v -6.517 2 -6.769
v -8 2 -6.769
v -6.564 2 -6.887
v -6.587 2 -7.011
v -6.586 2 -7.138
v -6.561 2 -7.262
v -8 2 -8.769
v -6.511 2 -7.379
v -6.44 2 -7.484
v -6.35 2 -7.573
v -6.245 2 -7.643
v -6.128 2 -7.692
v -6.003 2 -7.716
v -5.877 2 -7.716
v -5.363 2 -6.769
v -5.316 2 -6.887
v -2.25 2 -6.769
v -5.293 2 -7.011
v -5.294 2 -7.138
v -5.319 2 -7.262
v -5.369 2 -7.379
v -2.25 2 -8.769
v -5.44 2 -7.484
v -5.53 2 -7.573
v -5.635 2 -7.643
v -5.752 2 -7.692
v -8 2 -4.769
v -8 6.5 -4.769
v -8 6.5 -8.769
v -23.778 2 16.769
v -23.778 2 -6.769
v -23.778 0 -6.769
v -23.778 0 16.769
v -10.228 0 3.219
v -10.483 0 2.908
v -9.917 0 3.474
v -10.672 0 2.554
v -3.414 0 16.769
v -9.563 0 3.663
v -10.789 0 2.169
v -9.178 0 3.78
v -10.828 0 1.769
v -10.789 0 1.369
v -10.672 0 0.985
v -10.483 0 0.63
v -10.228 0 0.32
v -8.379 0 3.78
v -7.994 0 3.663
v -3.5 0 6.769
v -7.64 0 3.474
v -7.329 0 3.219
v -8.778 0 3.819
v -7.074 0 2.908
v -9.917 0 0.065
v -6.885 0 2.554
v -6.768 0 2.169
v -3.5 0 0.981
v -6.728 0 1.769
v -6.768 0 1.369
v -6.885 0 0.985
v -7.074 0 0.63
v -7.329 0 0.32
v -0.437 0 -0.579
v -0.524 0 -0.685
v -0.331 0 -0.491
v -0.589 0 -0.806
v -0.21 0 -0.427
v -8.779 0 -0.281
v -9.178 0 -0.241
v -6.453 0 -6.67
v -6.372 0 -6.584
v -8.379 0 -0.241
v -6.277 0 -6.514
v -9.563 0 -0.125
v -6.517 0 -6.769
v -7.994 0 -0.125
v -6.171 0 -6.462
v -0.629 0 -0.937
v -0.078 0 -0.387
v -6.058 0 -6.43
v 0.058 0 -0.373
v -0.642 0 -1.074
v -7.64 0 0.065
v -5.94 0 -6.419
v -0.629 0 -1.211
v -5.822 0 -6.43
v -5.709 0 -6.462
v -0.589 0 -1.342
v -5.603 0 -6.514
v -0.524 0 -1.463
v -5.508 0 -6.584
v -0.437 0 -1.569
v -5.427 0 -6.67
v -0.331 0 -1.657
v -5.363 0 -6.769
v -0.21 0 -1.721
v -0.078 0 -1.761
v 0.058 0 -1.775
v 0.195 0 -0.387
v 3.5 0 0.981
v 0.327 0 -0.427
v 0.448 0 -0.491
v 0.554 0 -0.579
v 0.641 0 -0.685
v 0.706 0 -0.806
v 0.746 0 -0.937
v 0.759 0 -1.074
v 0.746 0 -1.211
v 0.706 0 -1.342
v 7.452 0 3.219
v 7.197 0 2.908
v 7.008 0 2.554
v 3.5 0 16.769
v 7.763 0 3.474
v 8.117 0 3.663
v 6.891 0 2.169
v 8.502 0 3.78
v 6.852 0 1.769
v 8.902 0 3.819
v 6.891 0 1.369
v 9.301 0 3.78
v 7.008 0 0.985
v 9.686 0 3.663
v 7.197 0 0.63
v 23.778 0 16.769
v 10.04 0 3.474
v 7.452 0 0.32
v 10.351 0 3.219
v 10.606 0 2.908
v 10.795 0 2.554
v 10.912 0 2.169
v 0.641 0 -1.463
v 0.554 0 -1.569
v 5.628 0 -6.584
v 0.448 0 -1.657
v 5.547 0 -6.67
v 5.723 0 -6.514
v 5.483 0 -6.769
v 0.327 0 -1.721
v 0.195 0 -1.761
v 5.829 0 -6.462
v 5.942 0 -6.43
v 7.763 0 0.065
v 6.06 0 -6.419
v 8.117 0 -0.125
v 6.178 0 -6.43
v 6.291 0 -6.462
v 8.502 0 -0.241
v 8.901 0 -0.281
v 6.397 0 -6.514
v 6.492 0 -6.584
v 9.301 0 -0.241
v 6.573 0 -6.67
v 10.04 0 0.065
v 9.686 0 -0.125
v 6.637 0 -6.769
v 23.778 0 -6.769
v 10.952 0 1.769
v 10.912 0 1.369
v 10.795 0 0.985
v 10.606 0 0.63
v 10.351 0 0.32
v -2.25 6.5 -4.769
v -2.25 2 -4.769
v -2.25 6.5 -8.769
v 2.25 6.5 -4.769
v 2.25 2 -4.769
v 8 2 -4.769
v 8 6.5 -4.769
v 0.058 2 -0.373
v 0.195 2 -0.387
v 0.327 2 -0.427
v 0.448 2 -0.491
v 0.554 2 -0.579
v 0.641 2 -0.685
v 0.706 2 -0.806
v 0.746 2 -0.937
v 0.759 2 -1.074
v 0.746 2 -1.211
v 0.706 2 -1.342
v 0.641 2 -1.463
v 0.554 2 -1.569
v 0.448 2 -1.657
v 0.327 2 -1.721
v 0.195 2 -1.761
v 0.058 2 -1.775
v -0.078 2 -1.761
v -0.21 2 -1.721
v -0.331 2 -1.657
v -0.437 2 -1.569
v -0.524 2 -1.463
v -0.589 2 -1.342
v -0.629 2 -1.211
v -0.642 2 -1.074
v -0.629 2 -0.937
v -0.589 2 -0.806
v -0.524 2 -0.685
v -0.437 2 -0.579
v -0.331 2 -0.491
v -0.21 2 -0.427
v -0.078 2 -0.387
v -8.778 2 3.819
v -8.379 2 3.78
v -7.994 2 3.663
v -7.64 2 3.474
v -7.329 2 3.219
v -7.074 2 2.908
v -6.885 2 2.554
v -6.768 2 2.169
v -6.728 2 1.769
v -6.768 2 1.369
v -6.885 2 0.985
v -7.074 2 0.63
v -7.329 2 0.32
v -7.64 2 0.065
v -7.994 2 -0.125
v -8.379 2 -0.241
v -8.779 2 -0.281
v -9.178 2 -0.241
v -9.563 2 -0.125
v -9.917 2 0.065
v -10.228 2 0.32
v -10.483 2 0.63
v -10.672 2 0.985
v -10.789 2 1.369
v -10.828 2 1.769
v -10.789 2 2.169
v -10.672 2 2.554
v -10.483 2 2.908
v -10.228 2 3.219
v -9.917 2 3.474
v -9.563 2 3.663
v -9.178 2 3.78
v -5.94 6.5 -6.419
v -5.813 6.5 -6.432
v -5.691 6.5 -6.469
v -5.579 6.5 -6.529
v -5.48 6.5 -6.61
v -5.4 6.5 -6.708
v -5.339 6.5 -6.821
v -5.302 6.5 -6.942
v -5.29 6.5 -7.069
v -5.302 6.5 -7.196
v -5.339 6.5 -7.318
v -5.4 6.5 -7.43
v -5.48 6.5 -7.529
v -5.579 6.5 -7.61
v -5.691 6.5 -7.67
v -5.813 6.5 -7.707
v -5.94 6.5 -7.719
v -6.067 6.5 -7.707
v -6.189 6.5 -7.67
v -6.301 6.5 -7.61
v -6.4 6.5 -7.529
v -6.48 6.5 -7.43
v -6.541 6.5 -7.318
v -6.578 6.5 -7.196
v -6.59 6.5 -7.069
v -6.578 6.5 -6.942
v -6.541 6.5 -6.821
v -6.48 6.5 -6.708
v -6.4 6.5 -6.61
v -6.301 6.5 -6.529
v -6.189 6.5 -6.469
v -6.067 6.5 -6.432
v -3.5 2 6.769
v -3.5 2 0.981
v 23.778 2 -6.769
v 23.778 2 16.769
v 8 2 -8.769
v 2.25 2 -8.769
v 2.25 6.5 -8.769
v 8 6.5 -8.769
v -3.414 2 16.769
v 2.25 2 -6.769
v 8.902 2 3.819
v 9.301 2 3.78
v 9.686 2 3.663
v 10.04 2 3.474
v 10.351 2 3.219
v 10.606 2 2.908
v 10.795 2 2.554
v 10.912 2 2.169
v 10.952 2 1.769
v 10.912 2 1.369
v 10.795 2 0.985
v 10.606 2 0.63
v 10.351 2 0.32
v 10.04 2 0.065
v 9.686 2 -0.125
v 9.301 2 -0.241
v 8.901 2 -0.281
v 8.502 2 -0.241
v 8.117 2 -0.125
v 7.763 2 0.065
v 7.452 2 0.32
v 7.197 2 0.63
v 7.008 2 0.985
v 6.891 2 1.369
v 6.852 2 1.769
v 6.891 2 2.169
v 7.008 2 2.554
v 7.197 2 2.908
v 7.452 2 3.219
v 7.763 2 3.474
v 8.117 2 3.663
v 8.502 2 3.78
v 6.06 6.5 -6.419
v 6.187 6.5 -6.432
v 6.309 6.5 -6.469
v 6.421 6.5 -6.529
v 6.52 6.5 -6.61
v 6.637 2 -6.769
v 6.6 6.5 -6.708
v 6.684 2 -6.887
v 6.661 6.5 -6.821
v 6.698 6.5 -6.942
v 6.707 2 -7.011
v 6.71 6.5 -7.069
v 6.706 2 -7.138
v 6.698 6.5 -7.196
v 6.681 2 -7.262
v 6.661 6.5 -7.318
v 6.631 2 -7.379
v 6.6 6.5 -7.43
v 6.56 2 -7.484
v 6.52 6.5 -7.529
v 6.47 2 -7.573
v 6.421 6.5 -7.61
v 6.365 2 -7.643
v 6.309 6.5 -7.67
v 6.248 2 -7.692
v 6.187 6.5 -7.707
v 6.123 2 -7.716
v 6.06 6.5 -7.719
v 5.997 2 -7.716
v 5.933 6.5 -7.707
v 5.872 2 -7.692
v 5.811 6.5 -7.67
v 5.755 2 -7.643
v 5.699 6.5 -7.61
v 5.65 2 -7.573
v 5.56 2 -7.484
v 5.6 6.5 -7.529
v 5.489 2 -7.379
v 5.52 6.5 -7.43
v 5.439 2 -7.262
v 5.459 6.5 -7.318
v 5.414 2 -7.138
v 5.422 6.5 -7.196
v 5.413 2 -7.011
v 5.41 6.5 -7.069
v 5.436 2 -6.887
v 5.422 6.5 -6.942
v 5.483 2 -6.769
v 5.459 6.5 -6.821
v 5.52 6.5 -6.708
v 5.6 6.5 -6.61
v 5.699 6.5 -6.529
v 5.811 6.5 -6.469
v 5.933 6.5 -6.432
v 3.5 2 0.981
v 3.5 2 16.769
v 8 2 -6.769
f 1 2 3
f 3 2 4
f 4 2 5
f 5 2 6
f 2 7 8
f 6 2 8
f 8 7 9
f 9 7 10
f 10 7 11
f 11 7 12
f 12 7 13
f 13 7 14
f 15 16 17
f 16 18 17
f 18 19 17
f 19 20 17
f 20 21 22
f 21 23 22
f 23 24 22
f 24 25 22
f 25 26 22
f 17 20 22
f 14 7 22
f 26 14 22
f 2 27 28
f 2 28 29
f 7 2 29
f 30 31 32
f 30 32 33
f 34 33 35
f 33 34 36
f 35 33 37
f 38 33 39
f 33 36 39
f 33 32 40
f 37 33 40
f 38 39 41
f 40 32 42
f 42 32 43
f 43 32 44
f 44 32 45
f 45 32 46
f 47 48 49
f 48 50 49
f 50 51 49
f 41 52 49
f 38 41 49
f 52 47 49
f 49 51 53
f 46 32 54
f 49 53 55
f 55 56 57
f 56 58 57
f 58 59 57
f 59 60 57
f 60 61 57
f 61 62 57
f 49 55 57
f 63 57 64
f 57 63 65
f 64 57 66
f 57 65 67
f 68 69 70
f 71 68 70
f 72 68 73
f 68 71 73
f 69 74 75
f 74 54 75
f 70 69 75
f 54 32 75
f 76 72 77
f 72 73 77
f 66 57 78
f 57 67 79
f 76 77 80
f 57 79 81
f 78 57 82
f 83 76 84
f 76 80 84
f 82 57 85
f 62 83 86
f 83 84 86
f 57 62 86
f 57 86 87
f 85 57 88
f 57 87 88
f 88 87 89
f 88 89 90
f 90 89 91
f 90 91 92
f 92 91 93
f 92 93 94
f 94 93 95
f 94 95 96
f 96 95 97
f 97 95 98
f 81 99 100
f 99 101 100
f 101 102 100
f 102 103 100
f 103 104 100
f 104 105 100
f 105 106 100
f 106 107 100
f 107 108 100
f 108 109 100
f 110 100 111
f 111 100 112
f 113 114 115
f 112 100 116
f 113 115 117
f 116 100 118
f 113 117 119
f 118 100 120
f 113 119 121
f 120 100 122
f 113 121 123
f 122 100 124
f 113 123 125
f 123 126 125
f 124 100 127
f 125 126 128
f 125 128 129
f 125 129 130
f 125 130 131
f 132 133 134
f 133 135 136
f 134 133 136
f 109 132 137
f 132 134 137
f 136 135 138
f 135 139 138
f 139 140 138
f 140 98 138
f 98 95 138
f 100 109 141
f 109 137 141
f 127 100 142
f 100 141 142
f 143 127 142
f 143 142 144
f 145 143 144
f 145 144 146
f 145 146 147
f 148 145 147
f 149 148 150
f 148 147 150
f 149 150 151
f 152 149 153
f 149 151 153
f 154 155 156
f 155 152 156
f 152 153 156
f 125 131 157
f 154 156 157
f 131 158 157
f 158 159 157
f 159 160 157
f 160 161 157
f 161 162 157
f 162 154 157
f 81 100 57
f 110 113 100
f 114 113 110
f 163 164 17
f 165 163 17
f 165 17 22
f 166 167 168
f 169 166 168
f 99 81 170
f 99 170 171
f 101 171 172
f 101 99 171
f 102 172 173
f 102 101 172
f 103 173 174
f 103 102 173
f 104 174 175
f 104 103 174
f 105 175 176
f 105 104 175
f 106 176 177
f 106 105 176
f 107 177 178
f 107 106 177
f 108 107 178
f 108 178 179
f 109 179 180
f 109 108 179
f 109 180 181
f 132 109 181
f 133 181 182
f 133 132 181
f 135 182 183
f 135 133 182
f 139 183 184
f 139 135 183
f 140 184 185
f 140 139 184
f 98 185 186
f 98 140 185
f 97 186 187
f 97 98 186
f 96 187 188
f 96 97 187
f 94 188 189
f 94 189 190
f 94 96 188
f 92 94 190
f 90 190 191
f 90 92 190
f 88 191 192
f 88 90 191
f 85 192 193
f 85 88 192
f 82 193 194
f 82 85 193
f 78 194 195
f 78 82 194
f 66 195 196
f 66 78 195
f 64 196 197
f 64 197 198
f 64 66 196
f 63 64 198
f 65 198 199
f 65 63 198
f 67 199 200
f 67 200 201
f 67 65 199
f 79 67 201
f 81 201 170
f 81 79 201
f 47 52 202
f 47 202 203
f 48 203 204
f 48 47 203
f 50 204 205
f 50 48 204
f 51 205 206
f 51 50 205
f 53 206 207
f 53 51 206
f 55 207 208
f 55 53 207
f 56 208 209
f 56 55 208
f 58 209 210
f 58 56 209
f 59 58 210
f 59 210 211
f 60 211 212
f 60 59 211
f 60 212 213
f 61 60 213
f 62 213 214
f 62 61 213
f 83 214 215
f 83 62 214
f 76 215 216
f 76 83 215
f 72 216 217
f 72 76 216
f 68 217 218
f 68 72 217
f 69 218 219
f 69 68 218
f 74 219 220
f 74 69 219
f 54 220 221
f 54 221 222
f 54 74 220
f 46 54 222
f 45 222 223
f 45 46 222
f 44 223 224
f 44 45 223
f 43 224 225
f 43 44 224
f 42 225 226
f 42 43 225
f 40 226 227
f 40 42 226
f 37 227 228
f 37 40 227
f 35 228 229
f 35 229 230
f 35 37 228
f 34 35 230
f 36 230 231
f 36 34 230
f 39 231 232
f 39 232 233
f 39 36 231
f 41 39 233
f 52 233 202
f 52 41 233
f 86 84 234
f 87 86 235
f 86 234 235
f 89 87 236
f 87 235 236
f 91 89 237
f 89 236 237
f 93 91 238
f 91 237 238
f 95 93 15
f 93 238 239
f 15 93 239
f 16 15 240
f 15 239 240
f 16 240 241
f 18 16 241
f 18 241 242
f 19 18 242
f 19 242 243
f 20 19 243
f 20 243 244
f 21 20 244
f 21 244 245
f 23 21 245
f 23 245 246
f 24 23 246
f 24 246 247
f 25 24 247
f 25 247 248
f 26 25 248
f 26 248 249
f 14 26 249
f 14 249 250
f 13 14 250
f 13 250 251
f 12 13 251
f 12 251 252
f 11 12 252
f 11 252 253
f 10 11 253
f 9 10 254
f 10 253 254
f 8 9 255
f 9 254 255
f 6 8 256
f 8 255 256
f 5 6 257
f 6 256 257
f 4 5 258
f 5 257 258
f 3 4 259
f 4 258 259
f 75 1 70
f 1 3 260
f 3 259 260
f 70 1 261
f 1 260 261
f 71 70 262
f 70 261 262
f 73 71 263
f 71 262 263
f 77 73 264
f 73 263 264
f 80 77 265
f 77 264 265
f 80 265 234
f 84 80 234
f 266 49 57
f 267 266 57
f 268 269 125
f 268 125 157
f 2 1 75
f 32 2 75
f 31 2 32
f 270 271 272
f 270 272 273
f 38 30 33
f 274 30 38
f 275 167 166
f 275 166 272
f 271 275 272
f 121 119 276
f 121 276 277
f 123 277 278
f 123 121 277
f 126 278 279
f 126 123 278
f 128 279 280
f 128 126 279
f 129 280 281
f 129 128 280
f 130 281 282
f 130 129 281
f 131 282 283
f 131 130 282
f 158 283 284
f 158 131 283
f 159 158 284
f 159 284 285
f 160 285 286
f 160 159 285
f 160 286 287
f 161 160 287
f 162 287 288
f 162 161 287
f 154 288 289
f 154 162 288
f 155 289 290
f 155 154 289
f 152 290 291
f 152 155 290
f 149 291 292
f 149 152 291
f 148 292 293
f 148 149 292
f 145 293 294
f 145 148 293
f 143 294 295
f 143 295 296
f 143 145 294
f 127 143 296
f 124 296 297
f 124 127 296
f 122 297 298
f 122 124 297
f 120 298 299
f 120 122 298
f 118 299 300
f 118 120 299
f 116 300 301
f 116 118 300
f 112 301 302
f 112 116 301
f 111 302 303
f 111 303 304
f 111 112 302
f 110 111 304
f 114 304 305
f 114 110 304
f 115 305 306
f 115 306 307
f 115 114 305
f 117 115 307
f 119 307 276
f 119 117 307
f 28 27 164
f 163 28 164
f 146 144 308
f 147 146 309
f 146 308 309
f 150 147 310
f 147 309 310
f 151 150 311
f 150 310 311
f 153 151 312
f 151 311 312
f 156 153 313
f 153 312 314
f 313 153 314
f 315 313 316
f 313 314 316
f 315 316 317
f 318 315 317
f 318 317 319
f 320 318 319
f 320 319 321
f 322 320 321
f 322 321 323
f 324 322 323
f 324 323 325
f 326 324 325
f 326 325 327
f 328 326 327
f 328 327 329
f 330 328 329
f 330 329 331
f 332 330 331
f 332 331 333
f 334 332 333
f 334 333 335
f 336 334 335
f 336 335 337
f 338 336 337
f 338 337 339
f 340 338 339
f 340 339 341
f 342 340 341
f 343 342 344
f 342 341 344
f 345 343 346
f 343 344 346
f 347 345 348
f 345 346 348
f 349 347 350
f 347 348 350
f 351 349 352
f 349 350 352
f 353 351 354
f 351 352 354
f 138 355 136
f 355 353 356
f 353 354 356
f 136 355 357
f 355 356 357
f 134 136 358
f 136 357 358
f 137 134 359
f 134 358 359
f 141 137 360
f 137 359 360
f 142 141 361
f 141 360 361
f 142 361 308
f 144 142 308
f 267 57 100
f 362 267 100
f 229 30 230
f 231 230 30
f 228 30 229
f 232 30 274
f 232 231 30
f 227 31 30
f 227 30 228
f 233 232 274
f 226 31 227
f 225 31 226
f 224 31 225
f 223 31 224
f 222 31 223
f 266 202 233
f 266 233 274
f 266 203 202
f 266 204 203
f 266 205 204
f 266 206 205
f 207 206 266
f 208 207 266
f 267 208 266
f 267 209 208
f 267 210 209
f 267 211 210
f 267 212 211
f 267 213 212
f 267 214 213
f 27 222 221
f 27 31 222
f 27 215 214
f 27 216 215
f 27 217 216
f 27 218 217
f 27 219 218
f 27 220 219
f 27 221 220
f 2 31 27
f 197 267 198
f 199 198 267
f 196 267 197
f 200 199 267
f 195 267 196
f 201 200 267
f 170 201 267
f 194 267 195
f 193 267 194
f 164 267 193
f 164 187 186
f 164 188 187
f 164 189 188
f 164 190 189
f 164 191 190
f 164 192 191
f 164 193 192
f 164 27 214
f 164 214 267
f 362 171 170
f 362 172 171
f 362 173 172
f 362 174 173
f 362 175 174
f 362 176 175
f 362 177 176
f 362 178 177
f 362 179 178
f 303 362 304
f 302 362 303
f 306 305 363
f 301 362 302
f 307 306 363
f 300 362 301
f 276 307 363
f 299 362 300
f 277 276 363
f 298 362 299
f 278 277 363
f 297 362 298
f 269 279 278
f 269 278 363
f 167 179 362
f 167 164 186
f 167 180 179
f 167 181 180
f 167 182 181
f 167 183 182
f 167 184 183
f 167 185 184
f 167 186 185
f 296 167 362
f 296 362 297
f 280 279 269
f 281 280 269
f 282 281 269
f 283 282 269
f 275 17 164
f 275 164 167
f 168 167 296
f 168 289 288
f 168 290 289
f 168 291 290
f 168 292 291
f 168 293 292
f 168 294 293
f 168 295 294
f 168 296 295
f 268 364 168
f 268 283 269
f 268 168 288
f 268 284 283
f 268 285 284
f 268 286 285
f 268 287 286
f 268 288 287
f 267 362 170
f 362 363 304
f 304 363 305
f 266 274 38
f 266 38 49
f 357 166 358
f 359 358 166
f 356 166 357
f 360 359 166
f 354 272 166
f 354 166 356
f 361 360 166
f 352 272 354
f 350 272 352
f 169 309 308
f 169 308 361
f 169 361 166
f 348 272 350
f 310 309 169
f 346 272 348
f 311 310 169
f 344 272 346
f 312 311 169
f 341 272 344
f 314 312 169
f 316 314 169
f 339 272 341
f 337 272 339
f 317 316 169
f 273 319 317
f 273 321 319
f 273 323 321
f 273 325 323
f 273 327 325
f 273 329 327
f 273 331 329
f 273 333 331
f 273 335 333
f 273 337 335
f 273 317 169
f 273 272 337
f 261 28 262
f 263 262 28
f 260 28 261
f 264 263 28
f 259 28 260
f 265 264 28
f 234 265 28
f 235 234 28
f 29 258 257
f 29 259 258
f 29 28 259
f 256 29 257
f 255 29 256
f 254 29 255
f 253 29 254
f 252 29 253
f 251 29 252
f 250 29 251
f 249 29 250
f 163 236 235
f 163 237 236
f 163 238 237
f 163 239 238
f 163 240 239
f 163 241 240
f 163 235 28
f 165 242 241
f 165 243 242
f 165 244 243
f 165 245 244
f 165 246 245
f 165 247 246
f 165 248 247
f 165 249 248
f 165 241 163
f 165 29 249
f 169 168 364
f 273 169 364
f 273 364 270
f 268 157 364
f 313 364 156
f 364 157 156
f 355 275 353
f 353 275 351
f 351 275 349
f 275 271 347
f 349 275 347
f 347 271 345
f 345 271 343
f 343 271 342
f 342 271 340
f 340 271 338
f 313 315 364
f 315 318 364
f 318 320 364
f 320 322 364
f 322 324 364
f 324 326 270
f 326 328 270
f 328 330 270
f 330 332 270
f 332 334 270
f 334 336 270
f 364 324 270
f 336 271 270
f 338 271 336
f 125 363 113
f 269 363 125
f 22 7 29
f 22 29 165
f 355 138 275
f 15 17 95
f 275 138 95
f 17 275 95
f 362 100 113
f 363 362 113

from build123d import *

# Parameters (mm, degrees)
SKETCH2_R           = 2.05
SKETCH2_R_2         = 0.700643725
BOSS_EXTRUDE1_DEPTH = 2
SKETCH3_W           = 5.75
SKETCH3_H           = 4
BOSS_EXTRUDE2_DEPTH = 4.5
SKETCH4_R           = 0.65
CUT_EXTRUDE1_DEPTH  = 18.578324987
BOSS_EXTRUDE3_DEPTH = 2


with BuildPart() as part:
    # Sketch2 → Boss-Extrude1 (new body)
    with BuildSketch(Plane(origin=(0, 0, 0), x_dir=(1, 0, 0), z_dir=(0, 1, 0))):
        Polygon((-3.5, -6.76929), (-3.5, -0.98071), (3.5, -0.98071), (3.5, -6.76929), (13.7785, -6.76929), (13.7785, 6.76929), (-13.7785, 6.76929), (-13.7785, -6.76929), align=None)
        with Locations(Location((-8.7785, -1.76929, 0), (0, 0, 270))):
            Circle(SKETCH2_R, mode=Mode.SUBTRACT)
        with Locations(Location((8.9015, -1.76929, 0), (0, 0, 270))):
            Circle(SKETCH2_R, mode=Mode.SUBTRACT)
        with Locations(Location((0.0585, 1.07400228, 0), (0, 0, 270))):
            Circle(SKETCH2_R_2, mode=Mode.SUBTRACT)
    extrude(amount=BOSS_EXTRUDE1_DEPTH)

    # Sketch3 → Boss-Extrude2 (add)
    with BuildSketch(Plane(origin=(0, 2, 0), x_dir=(1, 0, 0), z_dir=(0, 1, 0))):
        with Locations((-5.125, 6.76929)):
            Rectangle(SKETCH3_W, SKETCH3_H)
        with Locations((5.125, 6.76929)):
            Rectangle(SKETCH3_W, SKETCH3_H)
    extrude(amount=BOSS_EXTRUDE2_DEPTH)

    # Sketch4 → Cut-Extrude1 (cut, through all)
    with BuildSketch(Plane(origin=(0, 6.5, 0), x_dir=(1, 0, 0), z_dir=(0, 1, 0))):
        with Locations(Location((-5.94, 7.06929, 0), (0, 0, 270))):
            Circle(SKETCH4_R)
        with Locations(Location((6.06, 7.06929, 0), (0, 0, 270))):
            Circle(SKETCH4_R)
    extrude(amount=-CUT_EXTRUDE1_DEPTH, mode=Mode.SUBTRACT)

    # Sketch5 → Boss-Extrude3 (add)
    with BuildSketch(Plane(origin=(0, 2, 0), x_dir=(1, 0, 0), z_dir=(0, 1, 0))):
        Polygon((-13.7785, 6.76929), (-23.7785, 6.76929), (-23.7785, -16.768919175), (-3.413881725, -16.768919175), (-3.5, -6.76929), (-13.7785, -6.76929), align=None)
        Polygon((3.5, -6.76929), (3.5, -16.768919175), (23.7785, -16.768919175), (23.7785, 6.76929), (13.7785, 6.76929), (13.7785, -6.76929), align=None)
    extrude(amount=-BOSS_EXTRUDE3_DEPTH)


solid = part.part
